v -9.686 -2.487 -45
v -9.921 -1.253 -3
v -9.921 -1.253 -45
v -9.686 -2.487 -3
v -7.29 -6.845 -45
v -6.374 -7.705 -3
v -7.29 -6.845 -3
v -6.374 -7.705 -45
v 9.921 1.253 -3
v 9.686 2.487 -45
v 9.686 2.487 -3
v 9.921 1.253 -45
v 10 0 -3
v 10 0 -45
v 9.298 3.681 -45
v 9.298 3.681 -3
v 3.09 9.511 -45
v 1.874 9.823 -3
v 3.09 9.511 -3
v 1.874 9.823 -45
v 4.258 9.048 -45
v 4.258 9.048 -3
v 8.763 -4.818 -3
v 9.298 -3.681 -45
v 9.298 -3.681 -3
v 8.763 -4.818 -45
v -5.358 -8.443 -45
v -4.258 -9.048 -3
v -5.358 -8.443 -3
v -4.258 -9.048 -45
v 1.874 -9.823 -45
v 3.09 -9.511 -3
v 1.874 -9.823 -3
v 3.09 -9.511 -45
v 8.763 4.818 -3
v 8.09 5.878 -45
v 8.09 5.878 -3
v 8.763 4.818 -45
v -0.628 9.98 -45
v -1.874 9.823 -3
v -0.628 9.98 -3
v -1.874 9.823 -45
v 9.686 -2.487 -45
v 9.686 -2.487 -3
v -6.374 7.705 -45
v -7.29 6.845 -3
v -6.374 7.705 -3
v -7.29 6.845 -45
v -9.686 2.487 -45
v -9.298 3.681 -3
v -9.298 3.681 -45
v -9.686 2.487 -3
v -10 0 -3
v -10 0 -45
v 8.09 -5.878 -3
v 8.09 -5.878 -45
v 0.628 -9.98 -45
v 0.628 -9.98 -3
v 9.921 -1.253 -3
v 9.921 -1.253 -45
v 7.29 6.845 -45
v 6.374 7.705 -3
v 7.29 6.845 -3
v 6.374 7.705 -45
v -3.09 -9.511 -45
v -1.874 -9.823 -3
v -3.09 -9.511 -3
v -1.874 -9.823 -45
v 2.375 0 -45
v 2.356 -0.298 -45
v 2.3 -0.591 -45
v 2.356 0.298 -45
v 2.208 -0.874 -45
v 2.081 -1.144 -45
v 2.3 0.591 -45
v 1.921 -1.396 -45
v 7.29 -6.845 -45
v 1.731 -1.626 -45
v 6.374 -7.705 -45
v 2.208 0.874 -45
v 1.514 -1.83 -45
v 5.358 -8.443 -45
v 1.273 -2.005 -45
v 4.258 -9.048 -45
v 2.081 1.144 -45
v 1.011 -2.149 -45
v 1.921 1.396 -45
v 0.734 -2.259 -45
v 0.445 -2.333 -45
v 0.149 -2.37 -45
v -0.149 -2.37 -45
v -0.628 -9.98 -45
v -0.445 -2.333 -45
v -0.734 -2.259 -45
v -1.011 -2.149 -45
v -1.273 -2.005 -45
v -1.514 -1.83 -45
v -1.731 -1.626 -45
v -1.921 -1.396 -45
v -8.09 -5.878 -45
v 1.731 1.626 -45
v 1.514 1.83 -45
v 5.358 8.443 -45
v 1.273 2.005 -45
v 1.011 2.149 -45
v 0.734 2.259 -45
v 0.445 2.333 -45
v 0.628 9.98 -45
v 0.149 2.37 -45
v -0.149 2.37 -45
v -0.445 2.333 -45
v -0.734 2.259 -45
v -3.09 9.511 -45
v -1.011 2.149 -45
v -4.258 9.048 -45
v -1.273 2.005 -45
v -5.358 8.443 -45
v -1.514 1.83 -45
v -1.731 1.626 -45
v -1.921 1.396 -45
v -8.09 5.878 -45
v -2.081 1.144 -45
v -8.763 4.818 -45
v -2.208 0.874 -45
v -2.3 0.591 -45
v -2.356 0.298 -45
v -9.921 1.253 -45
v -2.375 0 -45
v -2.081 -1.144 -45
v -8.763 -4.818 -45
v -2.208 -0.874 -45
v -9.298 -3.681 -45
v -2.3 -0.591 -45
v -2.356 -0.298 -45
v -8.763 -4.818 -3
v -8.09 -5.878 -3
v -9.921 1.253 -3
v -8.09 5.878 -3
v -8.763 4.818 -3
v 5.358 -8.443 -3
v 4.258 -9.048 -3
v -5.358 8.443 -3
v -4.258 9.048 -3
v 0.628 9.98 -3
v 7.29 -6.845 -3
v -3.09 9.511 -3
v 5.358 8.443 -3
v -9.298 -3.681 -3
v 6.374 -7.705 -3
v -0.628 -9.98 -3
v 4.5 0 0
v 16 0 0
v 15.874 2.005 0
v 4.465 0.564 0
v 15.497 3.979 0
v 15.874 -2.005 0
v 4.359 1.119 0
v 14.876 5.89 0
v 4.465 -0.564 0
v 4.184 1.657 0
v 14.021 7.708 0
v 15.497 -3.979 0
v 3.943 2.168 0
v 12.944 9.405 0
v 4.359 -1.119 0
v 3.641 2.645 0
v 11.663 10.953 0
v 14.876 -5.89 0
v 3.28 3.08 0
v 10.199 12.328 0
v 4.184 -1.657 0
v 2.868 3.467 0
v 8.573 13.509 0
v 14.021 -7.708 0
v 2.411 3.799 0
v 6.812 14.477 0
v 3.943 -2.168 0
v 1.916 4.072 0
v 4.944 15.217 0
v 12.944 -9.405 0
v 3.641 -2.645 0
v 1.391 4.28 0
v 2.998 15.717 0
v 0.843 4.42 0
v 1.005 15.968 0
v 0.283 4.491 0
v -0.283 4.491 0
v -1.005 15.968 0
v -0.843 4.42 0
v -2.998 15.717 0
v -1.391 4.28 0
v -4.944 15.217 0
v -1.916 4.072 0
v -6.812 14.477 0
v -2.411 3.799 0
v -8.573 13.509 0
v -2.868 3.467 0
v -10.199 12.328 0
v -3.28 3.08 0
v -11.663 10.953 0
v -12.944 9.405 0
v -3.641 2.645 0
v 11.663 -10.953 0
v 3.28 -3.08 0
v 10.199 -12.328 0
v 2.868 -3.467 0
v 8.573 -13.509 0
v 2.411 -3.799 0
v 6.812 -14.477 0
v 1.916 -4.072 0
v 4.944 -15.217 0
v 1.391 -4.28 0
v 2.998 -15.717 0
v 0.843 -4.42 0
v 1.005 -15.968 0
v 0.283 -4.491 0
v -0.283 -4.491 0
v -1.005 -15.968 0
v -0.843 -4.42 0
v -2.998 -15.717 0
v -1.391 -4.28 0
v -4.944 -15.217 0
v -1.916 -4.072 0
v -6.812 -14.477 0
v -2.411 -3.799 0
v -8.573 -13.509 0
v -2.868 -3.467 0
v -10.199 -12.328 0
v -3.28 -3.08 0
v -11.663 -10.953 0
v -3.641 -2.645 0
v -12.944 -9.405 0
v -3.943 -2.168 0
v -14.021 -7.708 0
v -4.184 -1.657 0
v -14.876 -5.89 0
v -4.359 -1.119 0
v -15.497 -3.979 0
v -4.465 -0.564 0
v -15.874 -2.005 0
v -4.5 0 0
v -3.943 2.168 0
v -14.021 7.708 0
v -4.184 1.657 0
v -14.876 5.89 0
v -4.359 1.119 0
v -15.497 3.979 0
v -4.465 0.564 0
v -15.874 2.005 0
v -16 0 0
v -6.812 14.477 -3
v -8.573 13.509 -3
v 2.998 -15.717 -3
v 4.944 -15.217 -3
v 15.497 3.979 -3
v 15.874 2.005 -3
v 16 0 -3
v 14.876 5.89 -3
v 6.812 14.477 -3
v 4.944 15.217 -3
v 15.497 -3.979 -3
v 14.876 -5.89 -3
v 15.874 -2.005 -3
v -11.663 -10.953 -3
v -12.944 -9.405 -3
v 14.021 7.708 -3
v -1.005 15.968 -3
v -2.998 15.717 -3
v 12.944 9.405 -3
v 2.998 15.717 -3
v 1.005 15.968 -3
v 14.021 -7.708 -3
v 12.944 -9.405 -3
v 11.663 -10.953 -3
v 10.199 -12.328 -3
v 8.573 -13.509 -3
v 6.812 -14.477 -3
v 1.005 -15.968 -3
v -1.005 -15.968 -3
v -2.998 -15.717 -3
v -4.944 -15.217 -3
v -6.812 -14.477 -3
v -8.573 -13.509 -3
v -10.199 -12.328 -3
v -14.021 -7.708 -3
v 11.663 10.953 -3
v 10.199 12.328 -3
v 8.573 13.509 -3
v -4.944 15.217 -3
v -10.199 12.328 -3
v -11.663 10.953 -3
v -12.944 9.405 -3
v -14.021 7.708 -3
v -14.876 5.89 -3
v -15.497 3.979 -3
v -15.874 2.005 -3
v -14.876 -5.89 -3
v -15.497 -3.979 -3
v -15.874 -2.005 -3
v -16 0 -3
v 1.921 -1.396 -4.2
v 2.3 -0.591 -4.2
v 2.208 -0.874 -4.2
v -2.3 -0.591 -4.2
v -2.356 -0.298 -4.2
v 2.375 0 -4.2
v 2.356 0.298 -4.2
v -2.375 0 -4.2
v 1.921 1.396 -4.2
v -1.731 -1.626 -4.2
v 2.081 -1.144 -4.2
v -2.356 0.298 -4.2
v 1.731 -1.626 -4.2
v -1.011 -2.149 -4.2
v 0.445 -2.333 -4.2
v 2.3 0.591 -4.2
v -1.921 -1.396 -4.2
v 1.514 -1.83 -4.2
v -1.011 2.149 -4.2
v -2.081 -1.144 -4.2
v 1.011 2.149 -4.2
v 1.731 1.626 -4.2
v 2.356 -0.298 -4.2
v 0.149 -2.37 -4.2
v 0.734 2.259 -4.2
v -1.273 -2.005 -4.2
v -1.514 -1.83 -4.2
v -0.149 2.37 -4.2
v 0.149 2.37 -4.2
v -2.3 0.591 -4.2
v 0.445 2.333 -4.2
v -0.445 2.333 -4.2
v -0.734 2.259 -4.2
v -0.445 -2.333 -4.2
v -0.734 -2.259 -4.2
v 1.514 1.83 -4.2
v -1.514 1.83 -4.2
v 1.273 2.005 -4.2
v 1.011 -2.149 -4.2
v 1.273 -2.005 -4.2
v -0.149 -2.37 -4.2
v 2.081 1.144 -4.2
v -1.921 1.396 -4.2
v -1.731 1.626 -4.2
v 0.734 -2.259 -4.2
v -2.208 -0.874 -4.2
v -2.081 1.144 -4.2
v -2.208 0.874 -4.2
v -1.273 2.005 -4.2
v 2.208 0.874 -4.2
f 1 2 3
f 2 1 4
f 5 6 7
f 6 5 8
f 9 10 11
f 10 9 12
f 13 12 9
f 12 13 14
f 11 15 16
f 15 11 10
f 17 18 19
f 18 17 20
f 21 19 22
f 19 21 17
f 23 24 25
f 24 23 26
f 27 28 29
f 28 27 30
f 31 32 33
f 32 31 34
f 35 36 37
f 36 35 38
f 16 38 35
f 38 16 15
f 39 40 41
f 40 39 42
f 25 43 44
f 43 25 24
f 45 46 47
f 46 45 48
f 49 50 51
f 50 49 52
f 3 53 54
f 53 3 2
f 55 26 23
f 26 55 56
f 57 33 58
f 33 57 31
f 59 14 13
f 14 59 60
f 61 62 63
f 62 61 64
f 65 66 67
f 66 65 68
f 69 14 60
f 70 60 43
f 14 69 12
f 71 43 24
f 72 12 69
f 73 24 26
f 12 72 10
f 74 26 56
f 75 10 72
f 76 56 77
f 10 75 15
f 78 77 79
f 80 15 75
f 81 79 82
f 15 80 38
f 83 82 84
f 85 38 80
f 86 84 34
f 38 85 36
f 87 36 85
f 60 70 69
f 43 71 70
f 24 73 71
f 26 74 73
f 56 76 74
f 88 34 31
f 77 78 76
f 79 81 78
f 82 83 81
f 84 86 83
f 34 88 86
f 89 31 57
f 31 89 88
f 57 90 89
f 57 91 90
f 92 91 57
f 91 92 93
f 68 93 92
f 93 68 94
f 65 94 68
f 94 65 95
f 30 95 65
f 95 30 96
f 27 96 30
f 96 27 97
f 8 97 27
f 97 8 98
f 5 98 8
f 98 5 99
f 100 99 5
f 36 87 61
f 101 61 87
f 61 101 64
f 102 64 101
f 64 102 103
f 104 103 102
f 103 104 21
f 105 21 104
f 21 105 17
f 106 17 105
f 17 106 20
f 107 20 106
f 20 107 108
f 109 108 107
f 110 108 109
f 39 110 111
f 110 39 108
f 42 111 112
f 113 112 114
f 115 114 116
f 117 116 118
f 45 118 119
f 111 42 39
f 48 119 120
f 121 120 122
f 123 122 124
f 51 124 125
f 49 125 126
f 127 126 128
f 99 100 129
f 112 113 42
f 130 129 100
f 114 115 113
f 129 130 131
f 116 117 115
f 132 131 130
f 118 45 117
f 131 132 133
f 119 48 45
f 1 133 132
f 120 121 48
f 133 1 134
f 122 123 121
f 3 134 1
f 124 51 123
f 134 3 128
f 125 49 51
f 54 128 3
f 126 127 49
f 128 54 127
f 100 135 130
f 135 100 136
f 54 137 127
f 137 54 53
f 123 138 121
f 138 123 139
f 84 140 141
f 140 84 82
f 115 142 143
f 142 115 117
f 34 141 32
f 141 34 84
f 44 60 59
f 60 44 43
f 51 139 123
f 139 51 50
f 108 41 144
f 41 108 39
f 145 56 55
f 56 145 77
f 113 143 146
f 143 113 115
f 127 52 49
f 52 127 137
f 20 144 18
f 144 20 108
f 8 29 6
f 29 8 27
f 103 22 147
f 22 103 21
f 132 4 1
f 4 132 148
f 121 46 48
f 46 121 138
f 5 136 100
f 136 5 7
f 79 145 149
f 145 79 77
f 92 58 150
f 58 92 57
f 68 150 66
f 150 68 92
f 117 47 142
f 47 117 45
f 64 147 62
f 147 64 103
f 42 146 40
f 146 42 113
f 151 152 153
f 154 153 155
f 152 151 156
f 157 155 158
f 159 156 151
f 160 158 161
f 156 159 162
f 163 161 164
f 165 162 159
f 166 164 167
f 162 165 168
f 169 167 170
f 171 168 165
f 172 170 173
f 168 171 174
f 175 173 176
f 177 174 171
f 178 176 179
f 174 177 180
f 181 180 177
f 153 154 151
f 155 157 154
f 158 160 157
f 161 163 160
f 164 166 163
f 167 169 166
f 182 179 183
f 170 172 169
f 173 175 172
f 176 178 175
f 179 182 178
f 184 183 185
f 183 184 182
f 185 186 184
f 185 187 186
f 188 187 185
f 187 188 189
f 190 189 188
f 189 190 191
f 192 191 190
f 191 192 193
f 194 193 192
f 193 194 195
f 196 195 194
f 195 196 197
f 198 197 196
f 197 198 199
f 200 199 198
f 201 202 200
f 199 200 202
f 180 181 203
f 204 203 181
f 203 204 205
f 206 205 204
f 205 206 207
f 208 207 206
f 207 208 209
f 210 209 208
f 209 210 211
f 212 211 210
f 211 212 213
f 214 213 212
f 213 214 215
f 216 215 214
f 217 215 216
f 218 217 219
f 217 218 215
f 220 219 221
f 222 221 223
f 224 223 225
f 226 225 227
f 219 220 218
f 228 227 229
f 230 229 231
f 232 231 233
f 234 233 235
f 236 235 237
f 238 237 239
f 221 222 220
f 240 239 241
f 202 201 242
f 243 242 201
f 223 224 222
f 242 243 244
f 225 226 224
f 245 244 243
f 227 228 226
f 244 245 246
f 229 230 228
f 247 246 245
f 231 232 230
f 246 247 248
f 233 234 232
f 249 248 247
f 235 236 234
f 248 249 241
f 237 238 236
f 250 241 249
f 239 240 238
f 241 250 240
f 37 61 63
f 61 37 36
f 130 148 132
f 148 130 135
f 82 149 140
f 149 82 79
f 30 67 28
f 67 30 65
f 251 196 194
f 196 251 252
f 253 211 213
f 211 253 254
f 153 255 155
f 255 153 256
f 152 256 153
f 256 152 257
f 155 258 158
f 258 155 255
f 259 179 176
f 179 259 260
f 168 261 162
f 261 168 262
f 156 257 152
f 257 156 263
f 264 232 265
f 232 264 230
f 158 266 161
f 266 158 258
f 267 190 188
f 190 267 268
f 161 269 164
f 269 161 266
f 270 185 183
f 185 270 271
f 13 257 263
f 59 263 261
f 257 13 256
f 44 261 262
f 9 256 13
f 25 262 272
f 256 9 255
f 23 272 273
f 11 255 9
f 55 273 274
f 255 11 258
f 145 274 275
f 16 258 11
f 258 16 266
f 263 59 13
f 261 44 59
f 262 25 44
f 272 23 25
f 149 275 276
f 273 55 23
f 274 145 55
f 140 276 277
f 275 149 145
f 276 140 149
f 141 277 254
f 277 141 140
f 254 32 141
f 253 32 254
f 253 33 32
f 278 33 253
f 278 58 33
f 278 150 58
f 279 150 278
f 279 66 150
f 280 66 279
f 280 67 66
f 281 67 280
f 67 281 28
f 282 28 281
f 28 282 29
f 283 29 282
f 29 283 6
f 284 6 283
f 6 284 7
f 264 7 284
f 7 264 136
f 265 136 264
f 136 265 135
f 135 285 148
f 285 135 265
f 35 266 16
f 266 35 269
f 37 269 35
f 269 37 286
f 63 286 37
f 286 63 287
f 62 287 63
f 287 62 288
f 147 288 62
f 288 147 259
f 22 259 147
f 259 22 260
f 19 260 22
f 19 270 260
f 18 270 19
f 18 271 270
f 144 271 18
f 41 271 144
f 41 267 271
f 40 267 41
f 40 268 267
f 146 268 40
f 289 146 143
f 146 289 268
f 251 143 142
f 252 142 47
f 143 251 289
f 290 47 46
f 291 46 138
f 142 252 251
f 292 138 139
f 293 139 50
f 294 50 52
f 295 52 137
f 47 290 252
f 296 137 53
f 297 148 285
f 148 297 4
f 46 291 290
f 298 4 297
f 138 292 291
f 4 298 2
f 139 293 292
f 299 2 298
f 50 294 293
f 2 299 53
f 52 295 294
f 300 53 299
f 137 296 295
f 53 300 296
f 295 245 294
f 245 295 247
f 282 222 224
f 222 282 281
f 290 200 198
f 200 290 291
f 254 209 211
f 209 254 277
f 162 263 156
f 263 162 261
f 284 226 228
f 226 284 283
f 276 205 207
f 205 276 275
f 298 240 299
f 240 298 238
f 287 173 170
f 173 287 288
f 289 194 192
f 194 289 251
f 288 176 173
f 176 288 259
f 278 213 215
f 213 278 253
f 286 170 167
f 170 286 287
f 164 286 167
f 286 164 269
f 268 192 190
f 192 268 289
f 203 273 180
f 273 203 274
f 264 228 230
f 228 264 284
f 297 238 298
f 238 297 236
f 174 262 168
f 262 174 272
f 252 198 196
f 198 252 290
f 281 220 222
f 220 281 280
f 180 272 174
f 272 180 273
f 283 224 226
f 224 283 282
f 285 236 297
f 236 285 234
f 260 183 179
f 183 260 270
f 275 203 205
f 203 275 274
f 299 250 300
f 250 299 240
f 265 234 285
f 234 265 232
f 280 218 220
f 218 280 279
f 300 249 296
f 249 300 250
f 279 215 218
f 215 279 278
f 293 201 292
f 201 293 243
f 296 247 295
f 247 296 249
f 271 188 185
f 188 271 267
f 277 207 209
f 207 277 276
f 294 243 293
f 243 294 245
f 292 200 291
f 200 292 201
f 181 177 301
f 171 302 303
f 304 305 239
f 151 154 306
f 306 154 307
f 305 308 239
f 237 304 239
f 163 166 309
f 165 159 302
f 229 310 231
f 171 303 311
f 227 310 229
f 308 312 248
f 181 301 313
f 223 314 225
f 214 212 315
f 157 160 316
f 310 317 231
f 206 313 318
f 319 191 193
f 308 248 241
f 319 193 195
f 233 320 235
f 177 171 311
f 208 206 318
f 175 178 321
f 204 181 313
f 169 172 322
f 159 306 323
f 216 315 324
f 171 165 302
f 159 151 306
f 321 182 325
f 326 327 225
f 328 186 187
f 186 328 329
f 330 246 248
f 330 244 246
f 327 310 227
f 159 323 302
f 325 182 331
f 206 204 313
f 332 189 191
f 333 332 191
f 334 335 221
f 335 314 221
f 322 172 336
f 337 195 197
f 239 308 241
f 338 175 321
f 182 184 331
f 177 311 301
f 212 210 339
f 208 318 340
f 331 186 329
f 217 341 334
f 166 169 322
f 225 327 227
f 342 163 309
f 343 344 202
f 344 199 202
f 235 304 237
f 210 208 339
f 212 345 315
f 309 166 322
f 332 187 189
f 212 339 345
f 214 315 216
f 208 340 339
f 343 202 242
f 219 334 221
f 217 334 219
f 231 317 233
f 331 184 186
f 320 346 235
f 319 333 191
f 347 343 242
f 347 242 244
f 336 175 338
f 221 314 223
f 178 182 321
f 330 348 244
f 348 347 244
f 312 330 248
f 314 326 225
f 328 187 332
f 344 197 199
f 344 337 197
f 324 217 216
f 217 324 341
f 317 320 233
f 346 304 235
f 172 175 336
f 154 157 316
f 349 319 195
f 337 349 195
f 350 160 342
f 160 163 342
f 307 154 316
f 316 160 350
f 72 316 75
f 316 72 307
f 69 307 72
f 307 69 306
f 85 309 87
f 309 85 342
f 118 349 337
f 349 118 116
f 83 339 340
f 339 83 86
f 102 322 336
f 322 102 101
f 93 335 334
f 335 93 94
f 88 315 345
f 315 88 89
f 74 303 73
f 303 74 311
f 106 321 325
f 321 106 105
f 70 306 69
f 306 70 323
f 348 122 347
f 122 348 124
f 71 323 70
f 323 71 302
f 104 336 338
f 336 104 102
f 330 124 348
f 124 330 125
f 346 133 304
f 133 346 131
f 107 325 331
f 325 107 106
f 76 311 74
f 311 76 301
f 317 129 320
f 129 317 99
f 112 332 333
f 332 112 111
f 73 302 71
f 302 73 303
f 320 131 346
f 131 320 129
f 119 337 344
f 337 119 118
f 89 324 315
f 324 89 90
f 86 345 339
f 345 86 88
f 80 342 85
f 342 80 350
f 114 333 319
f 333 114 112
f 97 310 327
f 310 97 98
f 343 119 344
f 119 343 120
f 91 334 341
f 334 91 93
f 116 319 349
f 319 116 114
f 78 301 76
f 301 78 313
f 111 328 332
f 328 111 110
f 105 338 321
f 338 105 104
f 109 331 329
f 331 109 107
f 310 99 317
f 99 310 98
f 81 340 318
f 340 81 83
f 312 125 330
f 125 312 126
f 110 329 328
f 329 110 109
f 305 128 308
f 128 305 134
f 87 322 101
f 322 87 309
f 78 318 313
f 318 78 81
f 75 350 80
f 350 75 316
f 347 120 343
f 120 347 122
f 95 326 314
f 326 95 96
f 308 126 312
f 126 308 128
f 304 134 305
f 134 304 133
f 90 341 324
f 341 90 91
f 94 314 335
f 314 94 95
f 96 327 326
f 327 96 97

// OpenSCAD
$fn = 50;


difference() {
	union() {
		translate(v = [0, 0, -45.0000000000]) {
			cylinder(h = 45, r = 10.0000000000);
		}
		translate(v = [0, 0, -3.0000000000]) {
			cylinder(h = 3, r = 16.0000000000);
		}
	}
	union() {
		translate(v = [0, 0, 0]) {
			rotate(a = [0, 0, 0]) {
				difference() {
					union() {
						#translate(v = [0, 0, -45.0000000000]) {
							cylinder(h = 45, r = 2.2500000000);
						}
						#translate(v = [0, 0, -4.2000000000]) {
							cylinder(h = 4.2000000000, r = 10.0000000000, r1 = 2.3750000000, r2 = 4.5000000000);
						}
						#translate(v = [0, 0, -45.0000000000]) {
							cylinder(h = 45, r = 2.3750000000);
						}
						#translate(v = [0, 0, -45.0000000000]) {
							cylinder(h = 45, r = 2.2500000000);
						}
					}
					union();
				}
			}
		}
	}
}
